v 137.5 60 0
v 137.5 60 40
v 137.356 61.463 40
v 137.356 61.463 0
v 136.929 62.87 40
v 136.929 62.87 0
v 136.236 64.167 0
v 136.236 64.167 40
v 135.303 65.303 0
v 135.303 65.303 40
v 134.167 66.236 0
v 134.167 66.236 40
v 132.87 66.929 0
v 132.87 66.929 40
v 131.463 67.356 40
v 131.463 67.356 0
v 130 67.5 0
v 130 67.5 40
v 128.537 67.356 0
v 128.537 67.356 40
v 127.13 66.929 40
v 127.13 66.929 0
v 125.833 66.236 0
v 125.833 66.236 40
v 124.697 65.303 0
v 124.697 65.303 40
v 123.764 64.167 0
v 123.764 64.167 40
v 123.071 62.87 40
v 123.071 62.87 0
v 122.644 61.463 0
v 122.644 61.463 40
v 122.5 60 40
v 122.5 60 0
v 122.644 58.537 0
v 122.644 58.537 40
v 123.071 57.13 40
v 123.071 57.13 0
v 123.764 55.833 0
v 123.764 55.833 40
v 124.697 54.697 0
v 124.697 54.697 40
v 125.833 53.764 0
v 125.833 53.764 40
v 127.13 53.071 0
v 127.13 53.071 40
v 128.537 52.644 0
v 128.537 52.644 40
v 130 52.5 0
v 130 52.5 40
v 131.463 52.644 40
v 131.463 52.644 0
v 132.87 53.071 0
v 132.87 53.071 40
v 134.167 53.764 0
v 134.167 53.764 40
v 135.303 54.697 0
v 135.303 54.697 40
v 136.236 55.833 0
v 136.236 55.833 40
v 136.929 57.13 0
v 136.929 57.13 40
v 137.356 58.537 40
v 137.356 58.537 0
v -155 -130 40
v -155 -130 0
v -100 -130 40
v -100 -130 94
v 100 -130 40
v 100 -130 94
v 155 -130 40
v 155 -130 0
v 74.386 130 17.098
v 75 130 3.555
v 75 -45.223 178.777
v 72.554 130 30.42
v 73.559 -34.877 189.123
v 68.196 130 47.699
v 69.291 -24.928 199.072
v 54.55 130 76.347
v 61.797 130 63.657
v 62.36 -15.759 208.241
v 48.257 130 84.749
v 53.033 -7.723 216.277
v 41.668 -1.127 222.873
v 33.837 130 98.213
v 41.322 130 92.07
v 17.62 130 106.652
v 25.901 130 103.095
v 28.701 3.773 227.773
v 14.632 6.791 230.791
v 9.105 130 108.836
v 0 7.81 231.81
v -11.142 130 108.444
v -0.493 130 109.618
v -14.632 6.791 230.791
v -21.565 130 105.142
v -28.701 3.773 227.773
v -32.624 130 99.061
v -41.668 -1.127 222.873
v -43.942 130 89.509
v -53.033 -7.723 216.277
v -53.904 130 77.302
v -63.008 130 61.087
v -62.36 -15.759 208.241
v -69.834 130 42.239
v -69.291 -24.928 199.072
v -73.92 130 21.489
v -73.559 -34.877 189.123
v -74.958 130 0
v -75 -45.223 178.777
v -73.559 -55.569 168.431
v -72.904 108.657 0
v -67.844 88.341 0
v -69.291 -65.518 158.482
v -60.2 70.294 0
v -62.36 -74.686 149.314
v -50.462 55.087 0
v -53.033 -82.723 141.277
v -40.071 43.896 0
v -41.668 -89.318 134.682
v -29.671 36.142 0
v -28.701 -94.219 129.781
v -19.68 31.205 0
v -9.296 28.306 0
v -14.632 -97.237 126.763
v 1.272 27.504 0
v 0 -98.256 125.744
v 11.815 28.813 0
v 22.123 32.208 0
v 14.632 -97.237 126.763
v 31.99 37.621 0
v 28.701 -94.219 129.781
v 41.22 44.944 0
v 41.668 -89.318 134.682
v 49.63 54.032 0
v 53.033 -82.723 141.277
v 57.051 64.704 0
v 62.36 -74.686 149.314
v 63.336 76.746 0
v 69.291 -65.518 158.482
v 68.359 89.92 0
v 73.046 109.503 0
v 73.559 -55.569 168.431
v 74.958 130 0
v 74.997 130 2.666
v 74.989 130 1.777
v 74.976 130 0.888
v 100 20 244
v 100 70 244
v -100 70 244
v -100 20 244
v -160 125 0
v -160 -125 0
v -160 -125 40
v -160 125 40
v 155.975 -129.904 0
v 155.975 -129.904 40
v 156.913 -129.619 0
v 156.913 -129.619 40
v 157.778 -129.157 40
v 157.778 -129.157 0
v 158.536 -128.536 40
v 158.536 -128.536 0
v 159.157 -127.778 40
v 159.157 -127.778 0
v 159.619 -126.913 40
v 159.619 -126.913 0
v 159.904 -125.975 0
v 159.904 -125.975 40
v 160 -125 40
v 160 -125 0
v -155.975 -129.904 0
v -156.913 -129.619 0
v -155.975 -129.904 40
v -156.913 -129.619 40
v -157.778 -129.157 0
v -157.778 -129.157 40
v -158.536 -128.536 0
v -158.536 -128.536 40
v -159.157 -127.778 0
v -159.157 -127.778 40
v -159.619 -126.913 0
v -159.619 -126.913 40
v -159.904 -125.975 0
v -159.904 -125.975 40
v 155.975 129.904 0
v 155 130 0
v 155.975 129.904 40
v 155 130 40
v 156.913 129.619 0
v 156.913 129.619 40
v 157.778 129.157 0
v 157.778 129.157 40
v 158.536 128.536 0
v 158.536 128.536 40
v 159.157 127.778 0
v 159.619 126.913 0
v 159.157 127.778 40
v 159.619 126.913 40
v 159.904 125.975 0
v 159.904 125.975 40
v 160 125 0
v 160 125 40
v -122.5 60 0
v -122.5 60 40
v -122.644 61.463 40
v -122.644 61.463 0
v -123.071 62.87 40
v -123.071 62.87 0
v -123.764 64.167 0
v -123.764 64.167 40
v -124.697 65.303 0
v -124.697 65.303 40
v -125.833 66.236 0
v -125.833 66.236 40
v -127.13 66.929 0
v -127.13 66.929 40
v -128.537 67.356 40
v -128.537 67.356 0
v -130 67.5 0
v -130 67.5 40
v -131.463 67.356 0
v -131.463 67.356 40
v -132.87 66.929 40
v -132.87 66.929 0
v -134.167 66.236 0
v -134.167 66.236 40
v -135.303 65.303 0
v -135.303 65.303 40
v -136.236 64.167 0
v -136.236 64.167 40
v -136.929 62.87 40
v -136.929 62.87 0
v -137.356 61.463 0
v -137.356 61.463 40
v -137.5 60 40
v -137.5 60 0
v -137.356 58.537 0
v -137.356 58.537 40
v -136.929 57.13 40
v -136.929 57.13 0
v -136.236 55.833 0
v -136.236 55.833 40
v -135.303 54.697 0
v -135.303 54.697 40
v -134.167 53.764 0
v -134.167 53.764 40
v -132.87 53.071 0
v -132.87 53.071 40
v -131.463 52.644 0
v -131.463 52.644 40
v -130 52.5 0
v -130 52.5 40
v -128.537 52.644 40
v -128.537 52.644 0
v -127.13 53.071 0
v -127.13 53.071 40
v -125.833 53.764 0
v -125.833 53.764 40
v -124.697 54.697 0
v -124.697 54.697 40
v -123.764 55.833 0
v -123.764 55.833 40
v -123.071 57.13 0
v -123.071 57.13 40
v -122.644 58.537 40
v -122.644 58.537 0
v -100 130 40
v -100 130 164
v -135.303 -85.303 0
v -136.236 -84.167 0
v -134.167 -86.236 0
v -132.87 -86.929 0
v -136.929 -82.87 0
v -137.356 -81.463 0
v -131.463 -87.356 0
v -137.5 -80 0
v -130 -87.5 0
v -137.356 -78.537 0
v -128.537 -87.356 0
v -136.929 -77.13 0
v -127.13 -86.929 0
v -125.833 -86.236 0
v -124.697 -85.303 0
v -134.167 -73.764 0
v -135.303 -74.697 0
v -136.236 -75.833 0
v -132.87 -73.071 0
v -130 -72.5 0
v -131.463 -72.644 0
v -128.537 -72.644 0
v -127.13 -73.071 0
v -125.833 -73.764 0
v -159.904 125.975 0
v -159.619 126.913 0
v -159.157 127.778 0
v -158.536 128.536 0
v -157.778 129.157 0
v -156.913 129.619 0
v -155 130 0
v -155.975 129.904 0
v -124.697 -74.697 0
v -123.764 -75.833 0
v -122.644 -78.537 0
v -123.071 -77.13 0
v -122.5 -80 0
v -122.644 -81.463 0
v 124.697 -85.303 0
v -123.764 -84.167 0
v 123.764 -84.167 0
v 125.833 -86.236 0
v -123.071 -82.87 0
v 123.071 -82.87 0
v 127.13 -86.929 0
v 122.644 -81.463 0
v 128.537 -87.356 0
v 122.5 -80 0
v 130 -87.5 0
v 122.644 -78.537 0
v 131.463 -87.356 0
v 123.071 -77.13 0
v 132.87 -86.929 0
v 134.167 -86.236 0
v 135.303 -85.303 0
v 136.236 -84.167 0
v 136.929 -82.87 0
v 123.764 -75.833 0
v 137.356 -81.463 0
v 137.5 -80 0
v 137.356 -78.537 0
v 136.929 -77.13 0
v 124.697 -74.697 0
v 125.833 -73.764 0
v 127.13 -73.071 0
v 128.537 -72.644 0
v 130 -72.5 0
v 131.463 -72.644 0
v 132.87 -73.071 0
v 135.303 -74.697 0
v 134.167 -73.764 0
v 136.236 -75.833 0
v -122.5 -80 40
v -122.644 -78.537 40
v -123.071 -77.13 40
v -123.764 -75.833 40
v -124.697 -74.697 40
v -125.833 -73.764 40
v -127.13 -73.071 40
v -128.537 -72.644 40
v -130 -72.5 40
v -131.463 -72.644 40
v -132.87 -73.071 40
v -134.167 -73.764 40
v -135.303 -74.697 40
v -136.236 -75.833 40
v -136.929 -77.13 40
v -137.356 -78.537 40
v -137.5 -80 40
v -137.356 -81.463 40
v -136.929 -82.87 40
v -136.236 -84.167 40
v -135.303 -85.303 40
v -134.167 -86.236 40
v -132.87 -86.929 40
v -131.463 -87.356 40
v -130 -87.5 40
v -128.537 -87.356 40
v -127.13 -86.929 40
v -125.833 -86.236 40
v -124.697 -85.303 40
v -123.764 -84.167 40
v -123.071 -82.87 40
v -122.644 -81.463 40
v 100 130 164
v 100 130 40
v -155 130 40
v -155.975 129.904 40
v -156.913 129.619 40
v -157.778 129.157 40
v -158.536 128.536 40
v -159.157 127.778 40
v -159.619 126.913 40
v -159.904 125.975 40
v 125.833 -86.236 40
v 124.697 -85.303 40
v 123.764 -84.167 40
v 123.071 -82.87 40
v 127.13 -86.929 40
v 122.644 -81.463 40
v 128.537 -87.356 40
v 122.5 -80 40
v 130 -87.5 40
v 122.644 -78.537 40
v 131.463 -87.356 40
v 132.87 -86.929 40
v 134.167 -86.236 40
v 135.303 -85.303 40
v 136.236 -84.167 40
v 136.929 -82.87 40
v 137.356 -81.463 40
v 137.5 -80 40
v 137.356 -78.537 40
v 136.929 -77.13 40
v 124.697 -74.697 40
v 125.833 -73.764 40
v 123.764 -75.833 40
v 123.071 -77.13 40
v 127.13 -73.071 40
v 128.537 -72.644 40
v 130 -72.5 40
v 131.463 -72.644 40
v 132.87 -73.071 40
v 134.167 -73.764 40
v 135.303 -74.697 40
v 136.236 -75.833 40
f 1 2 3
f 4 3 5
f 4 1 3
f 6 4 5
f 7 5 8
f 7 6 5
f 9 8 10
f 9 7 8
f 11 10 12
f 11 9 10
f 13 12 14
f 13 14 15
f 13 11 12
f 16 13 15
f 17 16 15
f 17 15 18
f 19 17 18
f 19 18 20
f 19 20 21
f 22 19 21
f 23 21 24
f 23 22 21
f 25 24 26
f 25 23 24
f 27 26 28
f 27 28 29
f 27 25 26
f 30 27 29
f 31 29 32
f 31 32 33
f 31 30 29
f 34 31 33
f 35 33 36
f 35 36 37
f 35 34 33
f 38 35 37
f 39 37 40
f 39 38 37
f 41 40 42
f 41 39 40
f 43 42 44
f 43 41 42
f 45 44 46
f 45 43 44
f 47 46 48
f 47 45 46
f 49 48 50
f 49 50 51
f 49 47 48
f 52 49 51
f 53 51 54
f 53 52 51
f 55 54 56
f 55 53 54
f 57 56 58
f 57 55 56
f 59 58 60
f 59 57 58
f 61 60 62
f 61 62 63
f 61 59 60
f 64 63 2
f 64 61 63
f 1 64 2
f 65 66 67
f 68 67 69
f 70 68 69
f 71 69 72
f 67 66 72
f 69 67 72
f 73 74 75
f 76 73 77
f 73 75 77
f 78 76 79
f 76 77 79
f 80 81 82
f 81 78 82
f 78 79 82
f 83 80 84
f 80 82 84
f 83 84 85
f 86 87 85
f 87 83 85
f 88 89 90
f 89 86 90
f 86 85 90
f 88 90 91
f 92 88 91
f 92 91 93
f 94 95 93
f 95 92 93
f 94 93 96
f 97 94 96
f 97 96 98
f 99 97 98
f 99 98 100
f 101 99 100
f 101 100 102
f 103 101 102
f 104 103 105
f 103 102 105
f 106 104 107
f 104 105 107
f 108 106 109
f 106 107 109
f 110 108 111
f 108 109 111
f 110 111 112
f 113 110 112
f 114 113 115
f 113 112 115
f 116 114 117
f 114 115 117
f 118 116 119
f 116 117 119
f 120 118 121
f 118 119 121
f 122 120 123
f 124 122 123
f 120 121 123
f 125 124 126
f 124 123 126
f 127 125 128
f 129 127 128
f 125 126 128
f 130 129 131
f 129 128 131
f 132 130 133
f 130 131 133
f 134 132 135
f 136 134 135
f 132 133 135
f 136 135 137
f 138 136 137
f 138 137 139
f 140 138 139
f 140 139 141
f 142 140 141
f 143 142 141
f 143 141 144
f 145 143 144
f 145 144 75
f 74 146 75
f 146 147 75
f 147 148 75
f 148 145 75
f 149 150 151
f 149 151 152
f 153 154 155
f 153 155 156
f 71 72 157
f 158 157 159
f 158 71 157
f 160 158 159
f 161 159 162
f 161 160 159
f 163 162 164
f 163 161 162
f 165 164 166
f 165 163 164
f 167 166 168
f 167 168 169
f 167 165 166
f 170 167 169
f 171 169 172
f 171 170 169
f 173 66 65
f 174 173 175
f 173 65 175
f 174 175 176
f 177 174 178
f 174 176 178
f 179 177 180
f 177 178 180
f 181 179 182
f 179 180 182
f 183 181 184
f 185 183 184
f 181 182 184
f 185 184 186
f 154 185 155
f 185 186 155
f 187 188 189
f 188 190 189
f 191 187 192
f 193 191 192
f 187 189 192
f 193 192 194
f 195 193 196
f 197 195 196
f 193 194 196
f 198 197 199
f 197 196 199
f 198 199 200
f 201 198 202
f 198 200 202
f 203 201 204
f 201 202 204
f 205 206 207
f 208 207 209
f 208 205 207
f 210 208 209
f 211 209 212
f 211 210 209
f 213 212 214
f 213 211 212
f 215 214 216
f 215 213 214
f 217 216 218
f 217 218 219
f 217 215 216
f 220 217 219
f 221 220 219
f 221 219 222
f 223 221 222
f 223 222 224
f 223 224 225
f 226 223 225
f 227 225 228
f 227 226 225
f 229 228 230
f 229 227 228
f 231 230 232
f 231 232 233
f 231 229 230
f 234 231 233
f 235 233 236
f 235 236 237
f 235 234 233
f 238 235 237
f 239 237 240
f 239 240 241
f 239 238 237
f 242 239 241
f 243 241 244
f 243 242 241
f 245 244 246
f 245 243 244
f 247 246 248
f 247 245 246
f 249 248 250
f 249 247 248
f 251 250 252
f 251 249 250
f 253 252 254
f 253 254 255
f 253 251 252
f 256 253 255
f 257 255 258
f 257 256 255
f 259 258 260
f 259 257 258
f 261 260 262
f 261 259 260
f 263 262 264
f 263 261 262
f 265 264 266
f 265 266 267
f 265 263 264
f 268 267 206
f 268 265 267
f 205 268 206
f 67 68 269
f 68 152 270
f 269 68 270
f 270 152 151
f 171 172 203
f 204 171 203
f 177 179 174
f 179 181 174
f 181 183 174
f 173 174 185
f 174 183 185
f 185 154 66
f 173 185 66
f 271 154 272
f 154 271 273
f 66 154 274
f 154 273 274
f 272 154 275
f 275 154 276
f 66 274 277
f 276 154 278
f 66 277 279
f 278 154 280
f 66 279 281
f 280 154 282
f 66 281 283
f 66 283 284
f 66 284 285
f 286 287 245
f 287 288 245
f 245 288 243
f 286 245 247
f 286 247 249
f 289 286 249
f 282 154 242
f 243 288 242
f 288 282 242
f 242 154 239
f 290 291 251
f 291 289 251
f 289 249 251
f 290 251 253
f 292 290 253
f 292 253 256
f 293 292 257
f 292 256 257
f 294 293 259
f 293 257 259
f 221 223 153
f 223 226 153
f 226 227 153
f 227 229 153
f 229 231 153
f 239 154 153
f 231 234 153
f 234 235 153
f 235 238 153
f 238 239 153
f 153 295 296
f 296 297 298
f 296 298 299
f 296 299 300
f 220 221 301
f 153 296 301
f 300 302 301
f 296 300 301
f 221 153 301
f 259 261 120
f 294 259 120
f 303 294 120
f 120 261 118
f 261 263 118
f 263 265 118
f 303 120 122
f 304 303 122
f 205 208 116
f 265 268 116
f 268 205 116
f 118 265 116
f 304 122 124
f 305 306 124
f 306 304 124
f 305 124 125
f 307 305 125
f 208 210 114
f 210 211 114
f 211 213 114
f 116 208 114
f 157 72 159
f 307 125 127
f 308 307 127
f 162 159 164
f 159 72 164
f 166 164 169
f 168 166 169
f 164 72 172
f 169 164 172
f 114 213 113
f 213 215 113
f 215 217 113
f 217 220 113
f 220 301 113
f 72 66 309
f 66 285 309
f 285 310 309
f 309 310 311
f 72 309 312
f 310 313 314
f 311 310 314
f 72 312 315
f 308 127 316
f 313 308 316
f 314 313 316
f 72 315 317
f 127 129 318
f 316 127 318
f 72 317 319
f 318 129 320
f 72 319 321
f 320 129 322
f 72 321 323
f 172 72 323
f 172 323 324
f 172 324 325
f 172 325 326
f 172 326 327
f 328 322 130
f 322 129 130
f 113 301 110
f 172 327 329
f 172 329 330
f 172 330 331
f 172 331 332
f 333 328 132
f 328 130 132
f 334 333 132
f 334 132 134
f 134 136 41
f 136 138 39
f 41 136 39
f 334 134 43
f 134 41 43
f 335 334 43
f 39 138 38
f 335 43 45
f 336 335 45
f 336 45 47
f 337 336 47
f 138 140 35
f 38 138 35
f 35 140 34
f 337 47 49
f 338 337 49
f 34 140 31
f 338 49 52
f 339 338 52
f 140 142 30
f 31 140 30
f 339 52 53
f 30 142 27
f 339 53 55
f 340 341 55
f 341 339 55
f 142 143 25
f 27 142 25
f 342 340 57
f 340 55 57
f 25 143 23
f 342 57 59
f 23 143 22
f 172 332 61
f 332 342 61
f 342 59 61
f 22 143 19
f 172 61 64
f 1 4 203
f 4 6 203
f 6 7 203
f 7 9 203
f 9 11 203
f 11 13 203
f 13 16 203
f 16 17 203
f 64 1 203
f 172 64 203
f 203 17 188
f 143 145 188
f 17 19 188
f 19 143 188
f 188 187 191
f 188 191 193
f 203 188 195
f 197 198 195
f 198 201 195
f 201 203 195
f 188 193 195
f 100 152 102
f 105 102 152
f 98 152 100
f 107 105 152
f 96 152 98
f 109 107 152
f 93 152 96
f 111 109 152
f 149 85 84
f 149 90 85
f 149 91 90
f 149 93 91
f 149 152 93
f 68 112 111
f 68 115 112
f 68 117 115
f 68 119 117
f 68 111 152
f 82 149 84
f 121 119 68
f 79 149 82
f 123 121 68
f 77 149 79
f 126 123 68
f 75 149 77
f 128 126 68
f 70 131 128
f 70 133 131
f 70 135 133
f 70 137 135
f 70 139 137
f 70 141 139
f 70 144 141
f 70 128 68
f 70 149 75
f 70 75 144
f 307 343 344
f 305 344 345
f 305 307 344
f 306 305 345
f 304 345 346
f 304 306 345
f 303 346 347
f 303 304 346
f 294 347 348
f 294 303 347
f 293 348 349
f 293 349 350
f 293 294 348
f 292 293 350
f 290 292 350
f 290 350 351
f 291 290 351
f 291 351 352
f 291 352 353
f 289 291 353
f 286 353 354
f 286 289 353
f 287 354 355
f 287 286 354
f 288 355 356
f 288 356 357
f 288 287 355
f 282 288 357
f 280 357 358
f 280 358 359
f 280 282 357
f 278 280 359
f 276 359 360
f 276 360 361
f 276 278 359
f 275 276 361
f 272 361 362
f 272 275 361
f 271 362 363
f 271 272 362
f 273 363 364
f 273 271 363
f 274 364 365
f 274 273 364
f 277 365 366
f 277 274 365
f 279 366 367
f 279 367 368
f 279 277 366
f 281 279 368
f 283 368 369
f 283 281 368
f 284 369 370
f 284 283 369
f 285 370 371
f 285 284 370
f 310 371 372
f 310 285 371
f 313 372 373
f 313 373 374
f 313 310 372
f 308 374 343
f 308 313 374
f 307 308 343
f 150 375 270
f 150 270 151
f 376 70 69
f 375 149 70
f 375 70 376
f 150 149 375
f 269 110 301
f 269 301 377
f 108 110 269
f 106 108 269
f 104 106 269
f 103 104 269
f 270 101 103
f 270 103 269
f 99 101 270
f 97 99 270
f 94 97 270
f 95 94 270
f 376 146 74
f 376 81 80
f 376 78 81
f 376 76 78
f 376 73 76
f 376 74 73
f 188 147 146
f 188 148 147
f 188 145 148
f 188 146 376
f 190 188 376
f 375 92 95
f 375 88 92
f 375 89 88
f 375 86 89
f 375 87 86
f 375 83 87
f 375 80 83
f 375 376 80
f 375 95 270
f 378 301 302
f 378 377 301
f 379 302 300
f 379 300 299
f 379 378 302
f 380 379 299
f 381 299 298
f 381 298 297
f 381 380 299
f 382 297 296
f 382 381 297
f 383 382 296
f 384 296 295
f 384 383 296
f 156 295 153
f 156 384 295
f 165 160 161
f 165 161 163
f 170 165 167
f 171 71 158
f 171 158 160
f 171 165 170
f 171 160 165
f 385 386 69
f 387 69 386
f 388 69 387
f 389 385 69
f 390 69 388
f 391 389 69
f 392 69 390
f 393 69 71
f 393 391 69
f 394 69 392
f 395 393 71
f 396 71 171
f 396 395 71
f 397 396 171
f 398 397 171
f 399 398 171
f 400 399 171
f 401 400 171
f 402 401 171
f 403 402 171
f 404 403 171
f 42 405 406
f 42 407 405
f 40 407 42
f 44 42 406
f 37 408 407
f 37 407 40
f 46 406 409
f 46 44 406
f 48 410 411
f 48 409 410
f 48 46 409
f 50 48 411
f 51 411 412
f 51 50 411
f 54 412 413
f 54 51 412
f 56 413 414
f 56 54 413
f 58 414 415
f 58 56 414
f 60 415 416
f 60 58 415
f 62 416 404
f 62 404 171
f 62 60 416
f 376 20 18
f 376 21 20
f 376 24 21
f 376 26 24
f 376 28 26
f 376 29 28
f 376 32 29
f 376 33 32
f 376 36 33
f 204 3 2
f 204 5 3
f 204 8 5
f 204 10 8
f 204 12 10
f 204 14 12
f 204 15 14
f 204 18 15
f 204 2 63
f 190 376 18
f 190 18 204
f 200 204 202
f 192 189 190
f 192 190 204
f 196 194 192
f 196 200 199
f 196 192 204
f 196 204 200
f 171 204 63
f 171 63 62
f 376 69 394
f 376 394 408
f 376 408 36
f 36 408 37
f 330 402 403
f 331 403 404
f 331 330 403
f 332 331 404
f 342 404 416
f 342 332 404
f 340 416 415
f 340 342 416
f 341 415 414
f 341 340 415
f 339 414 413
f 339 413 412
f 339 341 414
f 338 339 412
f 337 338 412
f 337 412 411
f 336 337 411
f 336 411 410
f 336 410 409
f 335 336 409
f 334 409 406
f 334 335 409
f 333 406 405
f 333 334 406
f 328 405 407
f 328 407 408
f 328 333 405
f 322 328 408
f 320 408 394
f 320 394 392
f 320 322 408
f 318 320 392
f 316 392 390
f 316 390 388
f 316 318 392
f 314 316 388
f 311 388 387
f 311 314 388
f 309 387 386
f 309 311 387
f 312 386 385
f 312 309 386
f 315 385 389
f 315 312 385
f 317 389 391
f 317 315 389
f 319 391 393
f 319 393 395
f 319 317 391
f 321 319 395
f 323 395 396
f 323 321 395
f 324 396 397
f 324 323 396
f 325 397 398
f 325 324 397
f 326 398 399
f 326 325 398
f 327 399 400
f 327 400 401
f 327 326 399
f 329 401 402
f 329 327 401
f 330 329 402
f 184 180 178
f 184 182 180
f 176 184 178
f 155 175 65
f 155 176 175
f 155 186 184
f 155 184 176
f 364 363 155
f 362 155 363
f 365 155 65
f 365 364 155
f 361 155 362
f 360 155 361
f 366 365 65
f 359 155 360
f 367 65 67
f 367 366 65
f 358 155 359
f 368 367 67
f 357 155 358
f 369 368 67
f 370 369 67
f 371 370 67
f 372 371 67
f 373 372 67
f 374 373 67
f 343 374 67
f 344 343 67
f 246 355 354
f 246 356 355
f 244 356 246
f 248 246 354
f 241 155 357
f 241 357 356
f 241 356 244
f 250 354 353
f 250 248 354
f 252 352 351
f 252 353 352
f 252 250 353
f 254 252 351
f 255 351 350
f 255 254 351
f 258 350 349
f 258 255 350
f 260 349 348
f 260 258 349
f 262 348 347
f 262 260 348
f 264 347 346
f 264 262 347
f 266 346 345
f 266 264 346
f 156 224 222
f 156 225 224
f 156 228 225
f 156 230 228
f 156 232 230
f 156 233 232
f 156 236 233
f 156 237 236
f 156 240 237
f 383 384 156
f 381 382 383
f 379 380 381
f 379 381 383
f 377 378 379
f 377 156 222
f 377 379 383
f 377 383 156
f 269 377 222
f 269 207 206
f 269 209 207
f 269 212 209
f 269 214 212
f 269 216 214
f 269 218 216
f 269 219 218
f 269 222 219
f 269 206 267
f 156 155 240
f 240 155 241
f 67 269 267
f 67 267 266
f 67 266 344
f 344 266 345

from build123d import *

# Parameters (mm, degrees)
F0_W     = 60
F0_H     = 260
F0_R     = 7.5
F1_DEPTH = 40
F0_W_2   = 200
F2_DEPTH = 94
F4_DEPTH = 200
F5_R     = 75
F6_DEPTH = 324.75
F7_R     = 5


with BuildPart() as f1:
    # F0 (on Top) → F1 (new body)
    with BuildSketch(Plane.XY):
        with Locations((130, 0)):
            Rectangle(F0_W, F0_H)
        with Locations((130, -80)):
            Circle(F0_R, mode=Mode.SUBTRACT)
        with Locations((130, 60)):
            Circle(F0_R, mode=Mode.SUBTRACT)
    extrude(amount=F1_DEPTH)



with BuildPart() as f1b:
    # F0 (on Top) → F1, piece 2 (new body)
    with BuildSketch(Plane.XY):
        with Locations((-130, 0)):
            Rectangle(F0_W, F0_H)
        with Locations((-130, -80)):
            Circle(F0_R, mode=Mode.SUBTRACT)
        with Locations((-130, 60)):
            Circle(F0_R, mode=Mode.SUBTRACT)
    extrude(amount=F1_DEPTH)


with BuildPart() as f1_1:
    add(f1.part)

    add(f1b.part)  # F2 merges F1b
    # F0 (on Top) → F2 (join)
    with BuildSketch(Plane.XY):
        Rectangle(F0_W_2, F0_H)
    extrude(amount=F2_DEPTH)

    # F3 (on face) → F4 (join)
    with BuildSketch(Plane.YZ.offset(100)):
        Polygon((20, 244), (-130, 94), (130, 94), (130, 164), (70, 244), align=None)
    extrude(amount=-F4_DEPTH)

    # F5 (on face) → F6 (cut)
    with BuildSketch(Plane(origin=(0, -112, 112), x_dir=(1, 0, 0), z_dir=(0, -0.7071067812, 0.7071067812))):
        with Locations((0, 94.4373130938)):
            Circle(F5_R)
    extrude(amount=-F6_DEPTH, mode=Mode.SUBTRACT)

    # F7
    f7_edges = [f1_1.edges().sort_by_distance(p)[0] for p in [
        (-160, -130, 20),
        (160, -130, 20),
        (160, 130, 20),
        (-160, 130, 20),
    ]]
    fillet(f7_edges, radius=F7_R)


solid = f1_1.part
